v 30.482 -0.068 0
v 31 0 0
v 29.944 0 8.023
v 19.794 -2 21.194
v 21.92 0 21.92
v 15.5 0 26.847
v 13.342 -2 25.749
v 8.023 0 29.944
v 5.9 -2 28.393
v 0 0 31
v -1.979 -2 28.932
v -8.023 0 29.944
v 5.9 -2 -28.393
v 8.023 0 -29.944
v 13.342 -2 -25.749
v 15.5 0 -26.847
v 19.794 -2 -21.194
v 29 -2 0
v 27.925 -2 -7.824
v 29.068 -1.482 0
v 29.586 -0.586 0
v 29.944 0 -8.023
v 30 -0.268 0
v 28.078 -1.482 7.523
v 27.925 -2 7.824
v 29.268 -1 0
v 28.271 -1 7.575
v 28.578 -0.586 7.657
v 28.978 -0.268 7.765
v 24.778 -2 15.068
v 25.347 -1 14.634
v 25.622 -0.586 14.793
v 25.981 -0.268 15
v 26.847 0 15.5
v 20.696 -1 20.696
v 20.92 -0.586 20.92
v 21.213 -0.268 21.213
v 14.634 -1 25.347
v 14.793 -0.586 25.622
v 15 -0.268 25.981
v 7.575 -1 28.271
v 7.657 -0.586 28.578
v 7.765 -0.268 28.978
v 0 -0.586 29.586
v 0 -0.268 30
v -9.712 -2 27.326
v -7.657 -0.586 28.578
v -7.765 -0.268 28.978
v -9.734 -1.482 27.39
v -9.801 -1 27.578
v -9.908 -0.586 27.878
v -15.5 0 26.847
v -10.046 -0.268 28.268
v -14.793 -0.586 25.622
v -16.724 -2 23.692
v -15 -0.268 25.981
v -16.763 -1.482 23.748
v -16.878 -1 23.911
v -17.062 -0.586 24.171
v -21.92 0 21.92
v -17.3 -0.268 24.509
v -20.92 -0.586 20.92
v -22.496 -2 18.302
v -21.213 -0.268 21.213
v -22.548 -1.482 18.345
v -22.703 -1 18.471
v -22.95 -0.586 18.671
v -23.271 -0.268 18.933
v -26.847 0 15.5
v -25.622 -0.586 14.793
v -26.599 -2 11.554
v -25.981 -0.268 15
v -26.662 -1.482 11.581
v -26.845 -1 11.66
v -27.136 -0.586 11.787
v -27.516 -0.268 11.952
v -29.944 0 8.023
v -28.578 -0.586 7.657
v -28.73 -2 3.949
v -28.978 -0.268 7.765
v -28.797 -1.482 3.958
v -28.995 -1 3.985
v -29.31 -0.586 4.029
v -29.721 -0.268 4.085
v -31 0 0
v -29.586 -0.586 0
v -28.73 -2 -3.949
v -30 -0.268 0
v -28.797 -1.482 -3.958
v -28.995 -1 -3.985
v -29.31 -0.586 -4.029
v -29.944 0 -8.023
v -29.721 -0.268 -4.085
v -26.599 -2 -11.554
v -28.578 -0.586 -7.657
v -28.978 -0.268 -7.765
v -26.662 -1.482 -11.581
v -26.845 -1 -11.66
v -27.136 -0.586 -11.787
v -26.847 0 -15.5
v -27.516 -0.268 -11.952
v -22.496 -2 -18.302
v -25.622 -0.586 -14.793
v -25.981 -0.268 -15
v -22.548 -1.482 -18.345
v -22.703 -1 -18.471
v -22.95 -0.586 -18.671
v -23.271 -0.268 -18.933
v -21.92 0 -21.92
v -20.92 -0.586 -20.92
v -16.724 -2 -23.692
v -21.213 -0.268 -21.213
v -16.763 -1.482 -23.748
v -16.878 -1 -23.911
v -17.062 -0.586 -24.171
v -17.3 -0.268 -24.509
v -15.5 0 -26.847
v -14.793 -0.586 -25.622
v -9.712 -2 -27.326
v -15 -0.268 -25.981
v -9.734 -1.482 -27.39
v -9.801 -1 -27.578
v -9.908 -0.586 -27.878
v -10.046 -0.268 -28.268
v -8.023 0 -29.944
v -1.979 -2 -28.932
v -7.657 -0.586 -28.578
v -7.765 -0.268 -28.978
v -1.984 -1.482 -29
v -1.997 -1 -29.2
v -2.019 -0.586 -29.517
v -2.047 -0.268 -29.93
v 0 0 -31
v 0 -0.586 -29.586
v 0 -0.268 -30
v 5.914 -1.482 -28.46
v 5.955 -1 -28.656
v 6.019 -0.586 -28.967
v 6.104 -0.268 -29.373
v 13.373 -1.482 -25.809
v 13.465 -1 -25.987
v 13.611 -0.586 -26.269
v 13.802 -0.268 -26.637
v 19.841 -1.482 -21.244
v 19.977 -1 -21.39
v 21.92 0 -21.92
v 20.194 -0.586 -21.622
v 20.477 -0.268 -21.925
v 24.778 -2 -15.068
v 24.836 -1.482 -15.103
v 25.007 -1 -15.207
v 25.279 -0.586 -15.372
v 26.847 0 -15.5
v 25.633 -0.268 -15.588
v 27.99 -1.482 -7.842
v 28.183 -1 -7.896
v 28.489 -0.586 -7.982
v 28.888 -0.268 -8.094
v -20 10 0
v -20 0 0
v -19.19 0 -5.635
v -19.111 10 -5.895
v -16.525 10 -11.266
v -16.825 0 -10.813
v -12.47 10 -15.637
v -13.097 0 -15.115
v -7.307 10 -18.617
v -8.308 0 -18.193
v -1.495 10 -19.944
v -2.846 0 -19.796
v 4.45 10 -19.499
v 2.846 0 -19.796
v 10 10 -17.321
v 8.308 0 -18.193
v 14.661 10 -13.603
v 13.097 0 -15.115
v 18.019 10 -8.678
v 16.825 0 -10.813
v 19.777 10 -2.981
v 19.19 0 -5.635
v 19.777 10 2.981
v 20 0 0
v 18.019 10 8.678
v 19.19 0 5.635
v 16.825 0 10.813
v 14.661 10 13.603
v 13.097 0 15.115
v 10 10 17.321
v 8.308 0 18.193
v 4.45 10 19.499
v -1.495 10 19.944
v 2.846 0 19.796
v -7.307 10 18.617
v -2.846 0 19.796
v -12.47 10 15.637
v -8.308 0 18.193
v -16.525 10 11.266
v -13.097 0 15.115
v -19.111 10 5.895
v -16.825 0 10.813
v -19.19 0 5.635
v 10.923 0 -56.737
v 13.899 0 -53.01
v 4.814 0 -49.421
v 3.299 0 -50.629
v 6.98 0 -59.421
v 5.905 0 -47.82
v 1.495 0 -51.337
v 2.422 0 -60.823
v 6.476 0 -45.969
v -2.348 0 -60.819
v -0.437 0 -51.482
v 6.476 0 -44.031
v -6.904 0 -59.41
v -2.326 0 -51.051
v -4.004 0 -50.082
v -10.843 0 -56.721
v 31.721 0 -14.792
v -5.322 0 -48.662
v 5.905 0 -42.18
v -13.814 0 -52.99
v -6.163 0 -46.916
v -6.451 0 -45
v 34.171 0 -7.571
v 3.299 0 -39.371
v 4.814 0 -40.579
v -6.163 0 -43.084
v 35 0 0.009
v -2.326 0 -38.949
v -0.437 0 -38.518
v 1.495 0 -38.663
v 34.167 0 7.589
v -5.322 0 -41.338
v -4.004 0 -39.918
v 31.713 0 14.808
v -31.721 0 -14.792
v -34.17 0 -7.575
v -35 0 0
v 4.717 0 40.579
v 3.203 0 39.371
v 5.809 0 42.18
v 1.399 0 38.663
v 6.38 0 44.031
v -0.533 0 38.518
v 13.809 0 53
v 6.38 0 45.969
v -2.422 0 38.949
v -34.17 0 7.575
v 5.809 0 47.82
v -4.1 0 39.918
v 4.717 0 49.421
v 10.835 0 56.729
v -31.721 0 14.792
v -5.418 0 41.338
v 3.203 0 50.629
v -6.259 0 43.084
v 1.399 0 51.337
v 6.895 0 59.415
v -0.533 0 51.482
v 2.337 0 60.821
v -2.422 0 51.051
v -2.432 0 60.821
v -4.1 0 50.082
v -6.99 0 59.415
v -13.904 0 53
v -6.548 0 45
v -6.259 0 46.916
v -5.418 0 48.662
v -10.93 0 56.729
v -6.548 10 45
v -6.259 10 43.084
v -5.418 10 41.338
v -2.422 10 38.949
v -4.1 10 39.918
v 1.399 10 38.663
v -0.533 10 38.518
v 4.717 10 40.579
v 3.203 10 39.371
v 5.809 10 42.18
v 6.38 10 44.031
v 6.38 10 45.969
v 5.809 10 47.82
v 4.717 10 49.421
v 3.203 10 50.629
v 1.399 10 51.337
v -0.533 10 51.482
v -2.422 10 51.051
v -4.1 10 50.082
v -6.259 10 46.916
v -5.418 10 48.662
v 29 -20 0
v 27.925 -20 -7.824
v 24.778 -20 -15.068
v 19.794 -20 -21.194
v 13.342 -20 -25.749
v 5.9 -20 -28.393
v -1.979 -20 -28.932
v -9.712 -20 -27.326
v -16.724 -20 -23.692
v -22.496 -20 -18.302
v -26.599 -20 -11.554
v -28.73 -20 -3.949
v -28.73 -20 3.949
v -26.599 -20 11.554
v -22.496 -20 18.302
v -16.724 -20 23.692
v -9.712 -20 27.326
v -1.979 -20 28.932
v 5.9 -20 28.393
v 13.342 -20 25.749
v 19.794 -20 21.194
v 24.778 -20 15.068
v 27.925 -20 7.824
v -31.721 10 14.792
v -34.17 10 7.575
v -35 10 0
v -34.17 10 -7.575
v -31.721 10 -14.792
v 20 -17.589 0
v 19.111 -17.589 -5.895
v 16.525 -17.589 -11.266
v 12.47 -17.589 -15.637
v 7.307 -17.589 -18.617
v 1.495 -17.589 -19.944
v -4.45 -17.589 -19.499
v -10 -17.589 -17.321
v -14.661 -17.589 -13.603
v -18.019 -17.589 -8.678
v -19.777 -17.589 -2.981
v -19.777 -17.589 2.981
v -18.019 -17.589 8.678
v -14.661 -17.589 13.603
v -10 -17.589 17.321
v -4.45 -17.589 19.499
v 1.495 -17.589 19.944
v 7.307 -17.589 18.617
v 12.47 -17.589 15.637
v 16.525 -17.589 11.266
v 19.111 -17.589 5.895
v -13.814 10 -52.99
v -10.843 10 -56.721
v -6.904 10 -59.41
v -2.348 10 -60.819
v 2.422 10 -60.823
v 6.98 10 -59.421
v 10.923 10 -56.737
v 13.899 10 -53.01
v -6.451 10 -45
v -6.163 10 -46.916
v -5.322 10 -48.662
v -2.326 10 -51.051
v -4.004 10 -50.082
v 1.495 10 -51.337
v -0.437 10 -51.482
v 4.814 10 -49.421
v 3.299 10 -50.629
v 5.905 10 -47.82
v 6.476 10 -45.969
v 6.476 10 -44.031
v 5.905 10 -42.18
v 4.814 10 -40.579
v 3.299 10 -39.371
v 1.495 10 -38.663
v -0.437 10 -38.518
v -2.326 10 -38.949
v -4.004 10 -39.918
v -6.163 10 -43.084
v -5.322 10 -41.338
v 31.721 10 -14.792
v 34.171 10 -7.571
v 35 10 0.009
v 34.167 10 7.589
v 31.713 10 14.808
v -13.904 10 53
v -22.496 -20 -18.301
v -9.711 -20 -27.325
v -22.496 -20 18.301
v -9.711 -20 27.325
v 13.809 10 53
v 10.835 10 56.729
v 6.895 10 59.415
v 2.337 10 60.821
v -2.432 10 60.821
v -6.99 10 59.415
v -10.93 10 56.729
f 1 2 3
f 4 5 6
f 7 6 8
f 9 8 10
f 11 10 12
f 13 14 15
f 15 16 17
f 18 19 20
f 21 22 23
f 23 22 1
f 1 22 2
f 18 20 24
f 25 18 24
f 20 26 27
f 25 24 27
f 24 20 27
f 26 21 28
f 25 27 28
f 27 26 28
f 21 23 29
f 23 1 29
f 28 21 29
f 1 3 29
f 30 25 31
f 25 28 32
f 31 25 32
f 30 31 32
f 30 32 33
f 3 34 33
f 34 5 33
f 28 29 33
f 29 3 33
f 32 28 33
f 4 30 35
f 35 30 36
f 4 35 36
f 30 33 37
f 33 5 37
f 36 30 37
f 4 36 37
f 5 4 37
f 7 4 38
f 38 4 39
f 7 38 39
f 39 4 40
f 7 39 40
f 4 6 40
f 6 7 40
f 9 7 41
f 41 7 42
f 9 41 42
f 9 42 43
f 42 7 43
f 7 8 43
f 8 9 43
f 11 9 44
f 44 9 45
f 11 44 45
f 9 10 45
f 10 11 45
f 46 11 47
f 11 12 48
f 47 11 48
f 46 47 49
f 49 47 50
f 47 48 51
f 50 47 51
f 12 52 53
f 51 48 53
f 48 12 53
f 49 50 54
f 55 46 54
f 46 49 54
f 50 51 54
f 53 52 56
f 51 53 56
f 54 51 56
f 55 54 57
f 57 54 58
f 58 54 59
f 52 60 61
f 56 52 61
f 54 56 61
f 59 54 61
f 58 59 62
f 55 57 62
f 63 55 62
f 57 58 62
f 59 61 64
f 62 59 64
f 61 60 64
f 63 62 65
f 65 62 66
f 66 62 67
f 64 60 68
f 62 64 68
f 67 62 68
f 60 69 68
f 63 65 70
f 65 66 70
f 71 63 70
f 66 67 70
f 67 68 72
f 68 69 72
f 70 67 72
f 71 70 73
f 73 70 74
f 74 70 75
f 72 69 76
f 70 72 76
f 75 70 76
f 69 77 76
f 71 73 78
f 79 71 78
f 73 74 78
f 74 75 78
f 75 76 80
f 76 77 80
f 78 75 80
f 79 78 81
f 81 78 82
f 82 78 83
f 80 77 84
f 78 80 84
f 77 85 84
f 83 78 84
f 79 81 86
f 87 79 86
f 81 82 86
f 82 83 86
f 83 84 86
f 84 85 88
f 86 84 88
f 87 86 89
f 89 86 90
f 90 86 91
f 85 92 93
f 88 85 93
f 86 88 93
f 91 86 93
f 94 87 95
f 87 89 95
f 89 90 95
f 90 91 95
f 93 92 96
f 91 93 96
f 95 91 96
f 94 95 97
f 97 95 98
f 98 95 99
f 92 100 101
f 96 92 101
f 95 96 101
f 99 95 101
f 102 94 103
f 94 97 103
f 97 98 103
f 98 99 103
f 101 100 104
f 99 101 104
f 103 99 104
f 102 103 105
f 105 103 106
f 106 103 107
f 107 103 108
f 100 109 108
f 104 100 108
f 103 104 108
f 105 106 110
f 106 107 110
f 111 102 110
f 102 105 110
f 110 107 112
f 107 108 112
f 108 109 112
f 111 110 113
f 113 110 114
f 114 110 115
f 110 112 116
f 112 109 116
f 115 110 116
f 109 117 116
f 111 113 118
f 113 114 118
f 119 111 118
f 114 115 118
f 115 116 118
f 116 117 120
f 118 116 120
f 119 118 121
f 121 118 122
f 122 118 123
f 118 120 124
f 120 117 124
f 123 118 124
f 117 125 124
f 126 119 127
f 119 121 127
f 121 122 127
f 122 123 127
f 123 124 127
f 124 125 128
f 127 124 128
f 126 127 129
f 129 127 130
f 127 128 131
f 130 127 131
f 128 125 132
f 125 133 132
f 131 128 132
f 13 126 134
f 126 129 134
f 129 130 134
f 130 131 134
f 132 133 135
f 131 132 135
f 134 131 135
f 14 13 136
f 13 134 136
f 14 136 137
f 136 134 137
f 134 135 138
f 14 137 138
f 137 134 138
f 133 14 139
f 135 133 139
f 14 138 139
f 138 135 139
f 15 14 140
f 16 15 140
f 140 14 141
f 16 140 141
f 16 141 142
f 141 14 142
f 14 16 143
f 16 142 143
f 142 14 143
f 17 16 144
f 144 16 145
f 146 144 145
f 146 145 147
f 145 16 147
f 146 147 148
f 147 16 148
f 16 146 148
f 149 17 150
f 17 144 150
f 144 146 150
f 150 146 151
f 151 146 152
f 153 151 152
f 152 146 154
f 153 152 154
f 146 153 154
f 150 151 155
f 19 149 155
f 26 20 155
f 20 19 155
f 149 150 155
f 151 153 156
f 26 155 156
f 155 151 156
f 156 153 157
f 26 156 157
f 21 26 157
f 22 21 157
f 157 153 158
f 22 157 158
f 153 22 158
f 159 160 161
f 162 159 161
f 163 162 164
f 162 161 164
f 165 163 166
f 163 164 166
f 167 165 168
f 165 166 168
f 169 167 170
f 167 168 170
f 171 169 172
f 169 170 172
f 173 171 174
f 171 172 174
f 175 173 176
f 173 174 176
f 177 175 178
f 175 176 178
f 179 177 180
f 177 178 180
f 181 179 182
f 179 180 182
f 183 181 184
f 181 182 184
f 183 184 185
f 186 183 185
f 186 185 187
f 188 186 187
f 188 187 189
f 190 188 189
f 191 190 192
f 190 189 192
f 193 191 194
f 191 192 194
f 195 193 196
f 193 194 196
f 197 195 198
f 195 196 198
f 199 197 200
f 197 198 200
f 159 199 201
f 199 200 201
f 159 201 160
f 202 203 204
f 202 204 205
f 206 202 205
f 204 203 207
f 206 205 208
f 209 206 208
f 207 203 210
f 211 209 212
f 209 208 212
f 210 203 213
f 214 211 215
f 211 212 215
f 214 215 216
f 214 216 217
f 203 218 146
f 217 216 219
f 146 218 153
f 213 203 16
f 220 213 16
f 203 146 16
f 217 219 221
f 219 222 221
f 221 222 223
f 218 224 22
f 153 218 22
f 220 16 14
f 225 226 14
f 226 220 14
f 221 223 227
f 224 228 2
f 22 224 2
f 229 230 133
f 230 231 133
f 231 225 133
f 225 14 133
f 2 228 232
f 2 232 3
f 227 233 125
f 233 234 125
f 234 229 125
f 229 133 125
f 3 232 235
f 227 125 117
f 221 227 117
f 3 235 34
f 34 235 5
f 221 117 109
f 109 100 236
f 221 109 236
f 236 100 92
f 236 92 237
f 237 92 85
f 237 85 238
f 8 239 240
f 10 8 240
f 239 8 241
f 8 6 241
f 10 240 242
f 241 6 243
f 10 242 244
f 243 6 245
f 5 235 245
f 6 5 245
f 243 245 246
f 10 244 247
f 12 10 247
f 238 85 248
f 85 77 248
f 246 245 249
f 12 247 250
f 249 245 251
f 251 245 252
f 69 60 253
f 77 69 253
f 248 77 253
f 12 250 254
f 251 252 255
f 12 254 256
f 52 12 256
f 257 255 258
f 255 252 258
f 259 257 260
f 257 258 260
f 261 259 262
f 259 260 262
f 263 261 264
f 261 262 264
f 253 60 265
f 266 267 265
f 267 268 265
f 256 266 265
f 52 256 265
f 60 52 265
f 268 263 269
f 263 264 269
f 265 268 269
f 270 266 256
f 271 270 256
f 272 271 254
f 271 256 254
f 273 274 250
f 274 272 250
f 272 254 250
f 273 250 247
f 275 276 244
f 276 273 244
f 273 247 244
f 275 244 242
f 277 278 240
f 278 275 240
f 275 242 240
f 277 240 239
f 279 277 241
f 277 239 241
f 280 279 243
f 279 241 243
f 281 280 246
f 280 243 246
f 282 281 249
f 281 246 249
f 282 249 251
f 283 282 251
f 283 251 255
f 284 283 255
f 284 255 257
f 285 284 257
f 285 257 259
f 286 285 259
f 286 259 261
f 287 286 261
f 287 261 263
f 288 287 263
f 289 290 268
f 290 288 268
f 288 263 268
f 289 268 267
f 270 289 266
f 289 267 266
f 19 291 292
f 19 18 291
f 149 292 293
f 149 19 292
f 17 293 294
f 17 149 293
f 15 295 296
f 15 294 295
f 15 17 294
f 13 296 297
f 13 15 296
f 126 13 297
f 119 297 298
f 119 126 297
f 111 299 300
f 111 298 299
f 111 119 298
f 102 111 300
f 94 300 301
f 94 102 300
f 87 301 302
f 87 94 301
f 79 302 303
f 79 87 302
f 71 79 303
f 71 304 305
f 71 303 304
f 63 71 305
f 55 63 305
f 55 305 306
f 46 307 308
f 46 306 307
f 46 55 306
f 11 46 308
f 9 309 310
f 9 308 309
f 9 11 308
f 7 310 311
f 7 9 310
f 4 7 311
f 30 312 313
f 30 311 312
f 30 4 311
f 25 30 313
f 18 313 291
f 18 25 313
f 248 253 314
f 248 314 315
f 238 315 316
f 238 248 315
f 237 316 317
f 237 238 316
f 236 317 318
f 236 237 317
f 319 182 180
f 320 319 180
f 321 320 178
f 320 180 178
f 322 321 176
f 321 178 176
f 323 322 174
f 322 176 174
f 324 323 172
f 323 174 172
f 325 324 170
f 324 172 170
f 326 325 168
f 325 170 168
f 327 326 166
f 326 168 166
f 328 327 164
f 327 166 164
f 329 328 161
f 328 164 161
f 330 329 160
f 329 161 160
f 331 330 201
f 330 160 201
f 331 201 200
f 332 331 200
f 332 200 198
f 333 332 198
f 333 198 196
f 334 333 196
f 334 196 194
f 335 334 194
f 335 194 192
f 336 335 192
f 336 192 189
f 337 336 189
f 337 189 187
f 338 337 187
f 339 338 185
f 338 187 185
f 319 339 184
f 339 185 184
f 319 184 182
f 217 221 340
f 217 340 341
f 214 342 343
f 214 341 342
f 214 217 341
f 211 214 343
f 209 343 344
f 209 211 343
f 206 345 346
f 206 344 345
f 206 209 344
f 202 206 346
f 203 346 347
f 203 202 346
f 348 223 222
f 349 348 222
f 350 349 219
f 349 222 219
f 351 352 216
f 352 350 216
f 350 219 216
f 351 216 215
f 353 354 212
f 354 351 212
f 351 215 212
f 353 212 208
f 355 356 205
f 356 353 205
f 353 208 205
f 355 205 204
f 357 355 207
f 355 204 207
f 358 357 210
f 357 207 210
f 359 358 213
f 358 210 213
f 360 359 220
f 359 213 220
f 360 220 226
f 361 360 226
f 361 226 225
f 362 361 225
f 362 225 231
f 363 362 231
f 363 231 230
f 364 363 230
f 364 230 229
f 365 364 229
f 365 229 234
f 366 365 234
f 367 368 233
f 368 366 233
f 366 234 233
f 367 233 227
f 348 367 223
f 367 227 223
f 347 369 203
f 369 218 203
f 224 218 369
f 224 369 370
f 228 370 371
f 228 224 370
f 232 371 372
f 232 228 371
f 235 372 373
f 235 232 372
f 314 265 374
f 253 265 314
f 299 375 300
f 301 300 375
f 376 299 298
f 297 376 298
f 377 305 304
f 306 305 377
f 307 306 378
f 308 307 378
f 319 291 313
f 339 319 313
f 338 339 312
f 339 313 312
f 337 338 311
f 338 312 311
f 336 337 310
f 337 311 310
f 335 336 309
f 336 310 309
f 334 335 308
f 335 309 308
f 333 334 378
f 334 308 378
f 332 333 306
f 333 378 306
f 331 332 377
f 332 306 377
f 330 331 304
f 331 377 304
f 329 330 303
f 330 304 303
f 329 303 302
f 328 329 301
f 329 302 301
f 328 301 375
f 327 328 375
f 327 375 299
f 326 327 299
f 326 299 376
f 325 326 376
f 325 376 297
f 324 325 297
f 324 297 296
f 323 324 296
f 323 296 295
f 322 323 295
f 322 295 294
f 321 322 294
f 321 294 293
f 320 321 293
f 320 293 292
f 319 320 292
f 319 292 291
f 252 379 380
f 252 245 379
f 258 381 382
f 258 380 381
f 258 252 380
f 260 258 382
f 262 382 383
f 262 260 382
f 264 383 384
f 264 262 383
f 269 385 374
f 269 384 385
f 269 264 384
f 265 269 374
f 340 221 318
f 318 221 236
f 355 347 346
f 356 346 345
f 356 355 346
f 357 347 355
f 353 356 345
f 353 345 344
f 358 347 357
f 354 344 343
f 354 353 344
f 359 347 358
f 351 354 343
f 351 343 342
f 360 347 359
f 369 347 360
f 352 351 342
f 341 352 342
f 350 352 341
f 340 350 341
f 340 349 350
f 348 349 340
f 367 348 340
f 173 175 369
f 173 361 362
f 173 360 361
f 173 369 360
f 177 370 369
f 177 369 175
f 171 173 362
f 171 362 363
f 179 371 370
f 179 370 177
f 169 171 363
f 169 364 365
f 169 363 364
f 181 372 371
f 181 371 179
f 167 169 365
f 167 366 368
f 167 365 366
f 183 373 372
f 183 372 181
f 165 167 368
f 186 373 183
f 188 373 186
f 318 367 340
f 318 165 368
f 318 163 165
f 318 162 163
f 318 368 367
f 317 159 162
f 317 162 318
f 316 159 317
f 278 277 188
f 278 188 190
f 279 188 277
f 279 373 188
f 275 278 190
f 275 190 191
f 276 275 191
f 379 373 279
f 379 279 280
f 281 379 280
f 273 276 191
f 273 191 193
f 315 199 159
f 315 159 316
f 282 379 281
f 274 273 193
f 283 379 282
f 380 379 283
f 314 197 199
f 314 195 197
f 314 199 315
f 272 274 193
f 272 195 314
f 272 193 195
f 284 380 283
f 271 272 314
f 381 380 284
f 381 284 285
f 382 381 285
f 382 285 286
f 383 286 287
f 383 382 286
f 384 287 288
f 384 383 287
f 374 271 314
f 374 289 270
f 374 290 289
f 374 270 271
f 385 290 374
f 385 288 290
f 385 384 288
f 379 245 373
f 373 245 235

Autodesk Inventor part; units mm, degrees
ref_plane "YZ Plane" through (0, 0, 0) normal (1, 0, 0) x (0, 1, 0)
ref_plane "XZ Plane" through (0, 0, 0) normal (0, 1, 0) x (-1, 0, 0)
ref_plane "XY Plane" through (0, 0, 0) normal (0, 0, 1) x (1, 0, 0)
sketch "スケッチ1" plane through (0, 0, 0) normal (0, 1, 0) x (-1, 0, 0)
  circle A0 centre (0, 0) radius 20
  circle A1 centre (0, 0) radius 29
  arc A2 (31.7208, -14.7916) -> (31.7208, 14.7916) centre (0, 0) ccw
  line L0 (0, 0) -> (31.7208, 14.7916) construction
  line L1 (0, 0) -> (35, 0) construction
  line L2 (0, 0) -> (31.7208, -14.7916) construction
  arc A3 (-31.7129, 14.8084) -> (-31.7208, -14.7915) centre (0, 0) ccw
  circle A4 centre (0.0475, 45) radius 6.5
  circle A5 centre (-0.0487, -45) radius 6.5
  arc A6 (13.9039, 53) -> (-13.8089, 53) centre (0.0475, 45) ccw
  line L3 (0.0475, 45) -> (13.9039, 53) construction
  line L4 (0.0475, 45) -> (16.0475, 45) construction
  line L5 (0.0475, 45) -> (-13.8089, 53) construction
  arc A7 (-13.8991, -53.0102) -> (13.8137, -52.9897) centre (-0.0487, -45) ccw
  line L6 (-0.0487, -45) -> (-13.8991, -53.0102) construction
  line L7 (-0.0487, -45) -> (13.8137, -52.9897) construction
  line L8 (13.9039, 53) -> (31.7208, 14.7916)
  line L9 (-13.8089, 53) -> (-31.7129, 14.8084)
  line L10 (-31.7208, -14.7915) -> (-13.8991, -53.0102)
  line L11 (13.8137, -52.9897) -> (31.7208, -14.7916)
  dimension "d0" = 40
  dimension "d1" = 58
  dimension "d2" = 35
  dimension "d3" = 25
  dimension "d4" = 50
  dimension "d5" = 35
  dimension "d6" = 13
  dimension "d7" = 13
  dimension "d8" = 45
  dimension "d9" = 45
  dimension "d10" = 16
  dimension "d11" = 30
  dimension "d12" = 120
  dimension "d13" = 16
  dimension "d14" = 120
extrude "押し出し1" add sketch "スケッチ1" along normal blind 10 contours A1 | L11 A7 L10 A3 L9 A6 L8 A2
sketch "スケッチ2" plane through (0, 0, 0) normal (0, -1, 0) x (1, 0, 0)
  circle A0 centre (0, 0) radius 29
  circle A1 centre (0, 0) radius 20
  dimension "d17" = 58
extrude "押し出し2" add sketch "スケッチ2" along normal blind 20
chamfer "面取り1" distance 9 angle 15 1 edges at (-20, -20, 0) measured on face at (25.5254, -20, -3.9088)
fillet "フィレット1" radius 2 1 edges at (-29, 0, 0)
properties part number "パッキン押え"
